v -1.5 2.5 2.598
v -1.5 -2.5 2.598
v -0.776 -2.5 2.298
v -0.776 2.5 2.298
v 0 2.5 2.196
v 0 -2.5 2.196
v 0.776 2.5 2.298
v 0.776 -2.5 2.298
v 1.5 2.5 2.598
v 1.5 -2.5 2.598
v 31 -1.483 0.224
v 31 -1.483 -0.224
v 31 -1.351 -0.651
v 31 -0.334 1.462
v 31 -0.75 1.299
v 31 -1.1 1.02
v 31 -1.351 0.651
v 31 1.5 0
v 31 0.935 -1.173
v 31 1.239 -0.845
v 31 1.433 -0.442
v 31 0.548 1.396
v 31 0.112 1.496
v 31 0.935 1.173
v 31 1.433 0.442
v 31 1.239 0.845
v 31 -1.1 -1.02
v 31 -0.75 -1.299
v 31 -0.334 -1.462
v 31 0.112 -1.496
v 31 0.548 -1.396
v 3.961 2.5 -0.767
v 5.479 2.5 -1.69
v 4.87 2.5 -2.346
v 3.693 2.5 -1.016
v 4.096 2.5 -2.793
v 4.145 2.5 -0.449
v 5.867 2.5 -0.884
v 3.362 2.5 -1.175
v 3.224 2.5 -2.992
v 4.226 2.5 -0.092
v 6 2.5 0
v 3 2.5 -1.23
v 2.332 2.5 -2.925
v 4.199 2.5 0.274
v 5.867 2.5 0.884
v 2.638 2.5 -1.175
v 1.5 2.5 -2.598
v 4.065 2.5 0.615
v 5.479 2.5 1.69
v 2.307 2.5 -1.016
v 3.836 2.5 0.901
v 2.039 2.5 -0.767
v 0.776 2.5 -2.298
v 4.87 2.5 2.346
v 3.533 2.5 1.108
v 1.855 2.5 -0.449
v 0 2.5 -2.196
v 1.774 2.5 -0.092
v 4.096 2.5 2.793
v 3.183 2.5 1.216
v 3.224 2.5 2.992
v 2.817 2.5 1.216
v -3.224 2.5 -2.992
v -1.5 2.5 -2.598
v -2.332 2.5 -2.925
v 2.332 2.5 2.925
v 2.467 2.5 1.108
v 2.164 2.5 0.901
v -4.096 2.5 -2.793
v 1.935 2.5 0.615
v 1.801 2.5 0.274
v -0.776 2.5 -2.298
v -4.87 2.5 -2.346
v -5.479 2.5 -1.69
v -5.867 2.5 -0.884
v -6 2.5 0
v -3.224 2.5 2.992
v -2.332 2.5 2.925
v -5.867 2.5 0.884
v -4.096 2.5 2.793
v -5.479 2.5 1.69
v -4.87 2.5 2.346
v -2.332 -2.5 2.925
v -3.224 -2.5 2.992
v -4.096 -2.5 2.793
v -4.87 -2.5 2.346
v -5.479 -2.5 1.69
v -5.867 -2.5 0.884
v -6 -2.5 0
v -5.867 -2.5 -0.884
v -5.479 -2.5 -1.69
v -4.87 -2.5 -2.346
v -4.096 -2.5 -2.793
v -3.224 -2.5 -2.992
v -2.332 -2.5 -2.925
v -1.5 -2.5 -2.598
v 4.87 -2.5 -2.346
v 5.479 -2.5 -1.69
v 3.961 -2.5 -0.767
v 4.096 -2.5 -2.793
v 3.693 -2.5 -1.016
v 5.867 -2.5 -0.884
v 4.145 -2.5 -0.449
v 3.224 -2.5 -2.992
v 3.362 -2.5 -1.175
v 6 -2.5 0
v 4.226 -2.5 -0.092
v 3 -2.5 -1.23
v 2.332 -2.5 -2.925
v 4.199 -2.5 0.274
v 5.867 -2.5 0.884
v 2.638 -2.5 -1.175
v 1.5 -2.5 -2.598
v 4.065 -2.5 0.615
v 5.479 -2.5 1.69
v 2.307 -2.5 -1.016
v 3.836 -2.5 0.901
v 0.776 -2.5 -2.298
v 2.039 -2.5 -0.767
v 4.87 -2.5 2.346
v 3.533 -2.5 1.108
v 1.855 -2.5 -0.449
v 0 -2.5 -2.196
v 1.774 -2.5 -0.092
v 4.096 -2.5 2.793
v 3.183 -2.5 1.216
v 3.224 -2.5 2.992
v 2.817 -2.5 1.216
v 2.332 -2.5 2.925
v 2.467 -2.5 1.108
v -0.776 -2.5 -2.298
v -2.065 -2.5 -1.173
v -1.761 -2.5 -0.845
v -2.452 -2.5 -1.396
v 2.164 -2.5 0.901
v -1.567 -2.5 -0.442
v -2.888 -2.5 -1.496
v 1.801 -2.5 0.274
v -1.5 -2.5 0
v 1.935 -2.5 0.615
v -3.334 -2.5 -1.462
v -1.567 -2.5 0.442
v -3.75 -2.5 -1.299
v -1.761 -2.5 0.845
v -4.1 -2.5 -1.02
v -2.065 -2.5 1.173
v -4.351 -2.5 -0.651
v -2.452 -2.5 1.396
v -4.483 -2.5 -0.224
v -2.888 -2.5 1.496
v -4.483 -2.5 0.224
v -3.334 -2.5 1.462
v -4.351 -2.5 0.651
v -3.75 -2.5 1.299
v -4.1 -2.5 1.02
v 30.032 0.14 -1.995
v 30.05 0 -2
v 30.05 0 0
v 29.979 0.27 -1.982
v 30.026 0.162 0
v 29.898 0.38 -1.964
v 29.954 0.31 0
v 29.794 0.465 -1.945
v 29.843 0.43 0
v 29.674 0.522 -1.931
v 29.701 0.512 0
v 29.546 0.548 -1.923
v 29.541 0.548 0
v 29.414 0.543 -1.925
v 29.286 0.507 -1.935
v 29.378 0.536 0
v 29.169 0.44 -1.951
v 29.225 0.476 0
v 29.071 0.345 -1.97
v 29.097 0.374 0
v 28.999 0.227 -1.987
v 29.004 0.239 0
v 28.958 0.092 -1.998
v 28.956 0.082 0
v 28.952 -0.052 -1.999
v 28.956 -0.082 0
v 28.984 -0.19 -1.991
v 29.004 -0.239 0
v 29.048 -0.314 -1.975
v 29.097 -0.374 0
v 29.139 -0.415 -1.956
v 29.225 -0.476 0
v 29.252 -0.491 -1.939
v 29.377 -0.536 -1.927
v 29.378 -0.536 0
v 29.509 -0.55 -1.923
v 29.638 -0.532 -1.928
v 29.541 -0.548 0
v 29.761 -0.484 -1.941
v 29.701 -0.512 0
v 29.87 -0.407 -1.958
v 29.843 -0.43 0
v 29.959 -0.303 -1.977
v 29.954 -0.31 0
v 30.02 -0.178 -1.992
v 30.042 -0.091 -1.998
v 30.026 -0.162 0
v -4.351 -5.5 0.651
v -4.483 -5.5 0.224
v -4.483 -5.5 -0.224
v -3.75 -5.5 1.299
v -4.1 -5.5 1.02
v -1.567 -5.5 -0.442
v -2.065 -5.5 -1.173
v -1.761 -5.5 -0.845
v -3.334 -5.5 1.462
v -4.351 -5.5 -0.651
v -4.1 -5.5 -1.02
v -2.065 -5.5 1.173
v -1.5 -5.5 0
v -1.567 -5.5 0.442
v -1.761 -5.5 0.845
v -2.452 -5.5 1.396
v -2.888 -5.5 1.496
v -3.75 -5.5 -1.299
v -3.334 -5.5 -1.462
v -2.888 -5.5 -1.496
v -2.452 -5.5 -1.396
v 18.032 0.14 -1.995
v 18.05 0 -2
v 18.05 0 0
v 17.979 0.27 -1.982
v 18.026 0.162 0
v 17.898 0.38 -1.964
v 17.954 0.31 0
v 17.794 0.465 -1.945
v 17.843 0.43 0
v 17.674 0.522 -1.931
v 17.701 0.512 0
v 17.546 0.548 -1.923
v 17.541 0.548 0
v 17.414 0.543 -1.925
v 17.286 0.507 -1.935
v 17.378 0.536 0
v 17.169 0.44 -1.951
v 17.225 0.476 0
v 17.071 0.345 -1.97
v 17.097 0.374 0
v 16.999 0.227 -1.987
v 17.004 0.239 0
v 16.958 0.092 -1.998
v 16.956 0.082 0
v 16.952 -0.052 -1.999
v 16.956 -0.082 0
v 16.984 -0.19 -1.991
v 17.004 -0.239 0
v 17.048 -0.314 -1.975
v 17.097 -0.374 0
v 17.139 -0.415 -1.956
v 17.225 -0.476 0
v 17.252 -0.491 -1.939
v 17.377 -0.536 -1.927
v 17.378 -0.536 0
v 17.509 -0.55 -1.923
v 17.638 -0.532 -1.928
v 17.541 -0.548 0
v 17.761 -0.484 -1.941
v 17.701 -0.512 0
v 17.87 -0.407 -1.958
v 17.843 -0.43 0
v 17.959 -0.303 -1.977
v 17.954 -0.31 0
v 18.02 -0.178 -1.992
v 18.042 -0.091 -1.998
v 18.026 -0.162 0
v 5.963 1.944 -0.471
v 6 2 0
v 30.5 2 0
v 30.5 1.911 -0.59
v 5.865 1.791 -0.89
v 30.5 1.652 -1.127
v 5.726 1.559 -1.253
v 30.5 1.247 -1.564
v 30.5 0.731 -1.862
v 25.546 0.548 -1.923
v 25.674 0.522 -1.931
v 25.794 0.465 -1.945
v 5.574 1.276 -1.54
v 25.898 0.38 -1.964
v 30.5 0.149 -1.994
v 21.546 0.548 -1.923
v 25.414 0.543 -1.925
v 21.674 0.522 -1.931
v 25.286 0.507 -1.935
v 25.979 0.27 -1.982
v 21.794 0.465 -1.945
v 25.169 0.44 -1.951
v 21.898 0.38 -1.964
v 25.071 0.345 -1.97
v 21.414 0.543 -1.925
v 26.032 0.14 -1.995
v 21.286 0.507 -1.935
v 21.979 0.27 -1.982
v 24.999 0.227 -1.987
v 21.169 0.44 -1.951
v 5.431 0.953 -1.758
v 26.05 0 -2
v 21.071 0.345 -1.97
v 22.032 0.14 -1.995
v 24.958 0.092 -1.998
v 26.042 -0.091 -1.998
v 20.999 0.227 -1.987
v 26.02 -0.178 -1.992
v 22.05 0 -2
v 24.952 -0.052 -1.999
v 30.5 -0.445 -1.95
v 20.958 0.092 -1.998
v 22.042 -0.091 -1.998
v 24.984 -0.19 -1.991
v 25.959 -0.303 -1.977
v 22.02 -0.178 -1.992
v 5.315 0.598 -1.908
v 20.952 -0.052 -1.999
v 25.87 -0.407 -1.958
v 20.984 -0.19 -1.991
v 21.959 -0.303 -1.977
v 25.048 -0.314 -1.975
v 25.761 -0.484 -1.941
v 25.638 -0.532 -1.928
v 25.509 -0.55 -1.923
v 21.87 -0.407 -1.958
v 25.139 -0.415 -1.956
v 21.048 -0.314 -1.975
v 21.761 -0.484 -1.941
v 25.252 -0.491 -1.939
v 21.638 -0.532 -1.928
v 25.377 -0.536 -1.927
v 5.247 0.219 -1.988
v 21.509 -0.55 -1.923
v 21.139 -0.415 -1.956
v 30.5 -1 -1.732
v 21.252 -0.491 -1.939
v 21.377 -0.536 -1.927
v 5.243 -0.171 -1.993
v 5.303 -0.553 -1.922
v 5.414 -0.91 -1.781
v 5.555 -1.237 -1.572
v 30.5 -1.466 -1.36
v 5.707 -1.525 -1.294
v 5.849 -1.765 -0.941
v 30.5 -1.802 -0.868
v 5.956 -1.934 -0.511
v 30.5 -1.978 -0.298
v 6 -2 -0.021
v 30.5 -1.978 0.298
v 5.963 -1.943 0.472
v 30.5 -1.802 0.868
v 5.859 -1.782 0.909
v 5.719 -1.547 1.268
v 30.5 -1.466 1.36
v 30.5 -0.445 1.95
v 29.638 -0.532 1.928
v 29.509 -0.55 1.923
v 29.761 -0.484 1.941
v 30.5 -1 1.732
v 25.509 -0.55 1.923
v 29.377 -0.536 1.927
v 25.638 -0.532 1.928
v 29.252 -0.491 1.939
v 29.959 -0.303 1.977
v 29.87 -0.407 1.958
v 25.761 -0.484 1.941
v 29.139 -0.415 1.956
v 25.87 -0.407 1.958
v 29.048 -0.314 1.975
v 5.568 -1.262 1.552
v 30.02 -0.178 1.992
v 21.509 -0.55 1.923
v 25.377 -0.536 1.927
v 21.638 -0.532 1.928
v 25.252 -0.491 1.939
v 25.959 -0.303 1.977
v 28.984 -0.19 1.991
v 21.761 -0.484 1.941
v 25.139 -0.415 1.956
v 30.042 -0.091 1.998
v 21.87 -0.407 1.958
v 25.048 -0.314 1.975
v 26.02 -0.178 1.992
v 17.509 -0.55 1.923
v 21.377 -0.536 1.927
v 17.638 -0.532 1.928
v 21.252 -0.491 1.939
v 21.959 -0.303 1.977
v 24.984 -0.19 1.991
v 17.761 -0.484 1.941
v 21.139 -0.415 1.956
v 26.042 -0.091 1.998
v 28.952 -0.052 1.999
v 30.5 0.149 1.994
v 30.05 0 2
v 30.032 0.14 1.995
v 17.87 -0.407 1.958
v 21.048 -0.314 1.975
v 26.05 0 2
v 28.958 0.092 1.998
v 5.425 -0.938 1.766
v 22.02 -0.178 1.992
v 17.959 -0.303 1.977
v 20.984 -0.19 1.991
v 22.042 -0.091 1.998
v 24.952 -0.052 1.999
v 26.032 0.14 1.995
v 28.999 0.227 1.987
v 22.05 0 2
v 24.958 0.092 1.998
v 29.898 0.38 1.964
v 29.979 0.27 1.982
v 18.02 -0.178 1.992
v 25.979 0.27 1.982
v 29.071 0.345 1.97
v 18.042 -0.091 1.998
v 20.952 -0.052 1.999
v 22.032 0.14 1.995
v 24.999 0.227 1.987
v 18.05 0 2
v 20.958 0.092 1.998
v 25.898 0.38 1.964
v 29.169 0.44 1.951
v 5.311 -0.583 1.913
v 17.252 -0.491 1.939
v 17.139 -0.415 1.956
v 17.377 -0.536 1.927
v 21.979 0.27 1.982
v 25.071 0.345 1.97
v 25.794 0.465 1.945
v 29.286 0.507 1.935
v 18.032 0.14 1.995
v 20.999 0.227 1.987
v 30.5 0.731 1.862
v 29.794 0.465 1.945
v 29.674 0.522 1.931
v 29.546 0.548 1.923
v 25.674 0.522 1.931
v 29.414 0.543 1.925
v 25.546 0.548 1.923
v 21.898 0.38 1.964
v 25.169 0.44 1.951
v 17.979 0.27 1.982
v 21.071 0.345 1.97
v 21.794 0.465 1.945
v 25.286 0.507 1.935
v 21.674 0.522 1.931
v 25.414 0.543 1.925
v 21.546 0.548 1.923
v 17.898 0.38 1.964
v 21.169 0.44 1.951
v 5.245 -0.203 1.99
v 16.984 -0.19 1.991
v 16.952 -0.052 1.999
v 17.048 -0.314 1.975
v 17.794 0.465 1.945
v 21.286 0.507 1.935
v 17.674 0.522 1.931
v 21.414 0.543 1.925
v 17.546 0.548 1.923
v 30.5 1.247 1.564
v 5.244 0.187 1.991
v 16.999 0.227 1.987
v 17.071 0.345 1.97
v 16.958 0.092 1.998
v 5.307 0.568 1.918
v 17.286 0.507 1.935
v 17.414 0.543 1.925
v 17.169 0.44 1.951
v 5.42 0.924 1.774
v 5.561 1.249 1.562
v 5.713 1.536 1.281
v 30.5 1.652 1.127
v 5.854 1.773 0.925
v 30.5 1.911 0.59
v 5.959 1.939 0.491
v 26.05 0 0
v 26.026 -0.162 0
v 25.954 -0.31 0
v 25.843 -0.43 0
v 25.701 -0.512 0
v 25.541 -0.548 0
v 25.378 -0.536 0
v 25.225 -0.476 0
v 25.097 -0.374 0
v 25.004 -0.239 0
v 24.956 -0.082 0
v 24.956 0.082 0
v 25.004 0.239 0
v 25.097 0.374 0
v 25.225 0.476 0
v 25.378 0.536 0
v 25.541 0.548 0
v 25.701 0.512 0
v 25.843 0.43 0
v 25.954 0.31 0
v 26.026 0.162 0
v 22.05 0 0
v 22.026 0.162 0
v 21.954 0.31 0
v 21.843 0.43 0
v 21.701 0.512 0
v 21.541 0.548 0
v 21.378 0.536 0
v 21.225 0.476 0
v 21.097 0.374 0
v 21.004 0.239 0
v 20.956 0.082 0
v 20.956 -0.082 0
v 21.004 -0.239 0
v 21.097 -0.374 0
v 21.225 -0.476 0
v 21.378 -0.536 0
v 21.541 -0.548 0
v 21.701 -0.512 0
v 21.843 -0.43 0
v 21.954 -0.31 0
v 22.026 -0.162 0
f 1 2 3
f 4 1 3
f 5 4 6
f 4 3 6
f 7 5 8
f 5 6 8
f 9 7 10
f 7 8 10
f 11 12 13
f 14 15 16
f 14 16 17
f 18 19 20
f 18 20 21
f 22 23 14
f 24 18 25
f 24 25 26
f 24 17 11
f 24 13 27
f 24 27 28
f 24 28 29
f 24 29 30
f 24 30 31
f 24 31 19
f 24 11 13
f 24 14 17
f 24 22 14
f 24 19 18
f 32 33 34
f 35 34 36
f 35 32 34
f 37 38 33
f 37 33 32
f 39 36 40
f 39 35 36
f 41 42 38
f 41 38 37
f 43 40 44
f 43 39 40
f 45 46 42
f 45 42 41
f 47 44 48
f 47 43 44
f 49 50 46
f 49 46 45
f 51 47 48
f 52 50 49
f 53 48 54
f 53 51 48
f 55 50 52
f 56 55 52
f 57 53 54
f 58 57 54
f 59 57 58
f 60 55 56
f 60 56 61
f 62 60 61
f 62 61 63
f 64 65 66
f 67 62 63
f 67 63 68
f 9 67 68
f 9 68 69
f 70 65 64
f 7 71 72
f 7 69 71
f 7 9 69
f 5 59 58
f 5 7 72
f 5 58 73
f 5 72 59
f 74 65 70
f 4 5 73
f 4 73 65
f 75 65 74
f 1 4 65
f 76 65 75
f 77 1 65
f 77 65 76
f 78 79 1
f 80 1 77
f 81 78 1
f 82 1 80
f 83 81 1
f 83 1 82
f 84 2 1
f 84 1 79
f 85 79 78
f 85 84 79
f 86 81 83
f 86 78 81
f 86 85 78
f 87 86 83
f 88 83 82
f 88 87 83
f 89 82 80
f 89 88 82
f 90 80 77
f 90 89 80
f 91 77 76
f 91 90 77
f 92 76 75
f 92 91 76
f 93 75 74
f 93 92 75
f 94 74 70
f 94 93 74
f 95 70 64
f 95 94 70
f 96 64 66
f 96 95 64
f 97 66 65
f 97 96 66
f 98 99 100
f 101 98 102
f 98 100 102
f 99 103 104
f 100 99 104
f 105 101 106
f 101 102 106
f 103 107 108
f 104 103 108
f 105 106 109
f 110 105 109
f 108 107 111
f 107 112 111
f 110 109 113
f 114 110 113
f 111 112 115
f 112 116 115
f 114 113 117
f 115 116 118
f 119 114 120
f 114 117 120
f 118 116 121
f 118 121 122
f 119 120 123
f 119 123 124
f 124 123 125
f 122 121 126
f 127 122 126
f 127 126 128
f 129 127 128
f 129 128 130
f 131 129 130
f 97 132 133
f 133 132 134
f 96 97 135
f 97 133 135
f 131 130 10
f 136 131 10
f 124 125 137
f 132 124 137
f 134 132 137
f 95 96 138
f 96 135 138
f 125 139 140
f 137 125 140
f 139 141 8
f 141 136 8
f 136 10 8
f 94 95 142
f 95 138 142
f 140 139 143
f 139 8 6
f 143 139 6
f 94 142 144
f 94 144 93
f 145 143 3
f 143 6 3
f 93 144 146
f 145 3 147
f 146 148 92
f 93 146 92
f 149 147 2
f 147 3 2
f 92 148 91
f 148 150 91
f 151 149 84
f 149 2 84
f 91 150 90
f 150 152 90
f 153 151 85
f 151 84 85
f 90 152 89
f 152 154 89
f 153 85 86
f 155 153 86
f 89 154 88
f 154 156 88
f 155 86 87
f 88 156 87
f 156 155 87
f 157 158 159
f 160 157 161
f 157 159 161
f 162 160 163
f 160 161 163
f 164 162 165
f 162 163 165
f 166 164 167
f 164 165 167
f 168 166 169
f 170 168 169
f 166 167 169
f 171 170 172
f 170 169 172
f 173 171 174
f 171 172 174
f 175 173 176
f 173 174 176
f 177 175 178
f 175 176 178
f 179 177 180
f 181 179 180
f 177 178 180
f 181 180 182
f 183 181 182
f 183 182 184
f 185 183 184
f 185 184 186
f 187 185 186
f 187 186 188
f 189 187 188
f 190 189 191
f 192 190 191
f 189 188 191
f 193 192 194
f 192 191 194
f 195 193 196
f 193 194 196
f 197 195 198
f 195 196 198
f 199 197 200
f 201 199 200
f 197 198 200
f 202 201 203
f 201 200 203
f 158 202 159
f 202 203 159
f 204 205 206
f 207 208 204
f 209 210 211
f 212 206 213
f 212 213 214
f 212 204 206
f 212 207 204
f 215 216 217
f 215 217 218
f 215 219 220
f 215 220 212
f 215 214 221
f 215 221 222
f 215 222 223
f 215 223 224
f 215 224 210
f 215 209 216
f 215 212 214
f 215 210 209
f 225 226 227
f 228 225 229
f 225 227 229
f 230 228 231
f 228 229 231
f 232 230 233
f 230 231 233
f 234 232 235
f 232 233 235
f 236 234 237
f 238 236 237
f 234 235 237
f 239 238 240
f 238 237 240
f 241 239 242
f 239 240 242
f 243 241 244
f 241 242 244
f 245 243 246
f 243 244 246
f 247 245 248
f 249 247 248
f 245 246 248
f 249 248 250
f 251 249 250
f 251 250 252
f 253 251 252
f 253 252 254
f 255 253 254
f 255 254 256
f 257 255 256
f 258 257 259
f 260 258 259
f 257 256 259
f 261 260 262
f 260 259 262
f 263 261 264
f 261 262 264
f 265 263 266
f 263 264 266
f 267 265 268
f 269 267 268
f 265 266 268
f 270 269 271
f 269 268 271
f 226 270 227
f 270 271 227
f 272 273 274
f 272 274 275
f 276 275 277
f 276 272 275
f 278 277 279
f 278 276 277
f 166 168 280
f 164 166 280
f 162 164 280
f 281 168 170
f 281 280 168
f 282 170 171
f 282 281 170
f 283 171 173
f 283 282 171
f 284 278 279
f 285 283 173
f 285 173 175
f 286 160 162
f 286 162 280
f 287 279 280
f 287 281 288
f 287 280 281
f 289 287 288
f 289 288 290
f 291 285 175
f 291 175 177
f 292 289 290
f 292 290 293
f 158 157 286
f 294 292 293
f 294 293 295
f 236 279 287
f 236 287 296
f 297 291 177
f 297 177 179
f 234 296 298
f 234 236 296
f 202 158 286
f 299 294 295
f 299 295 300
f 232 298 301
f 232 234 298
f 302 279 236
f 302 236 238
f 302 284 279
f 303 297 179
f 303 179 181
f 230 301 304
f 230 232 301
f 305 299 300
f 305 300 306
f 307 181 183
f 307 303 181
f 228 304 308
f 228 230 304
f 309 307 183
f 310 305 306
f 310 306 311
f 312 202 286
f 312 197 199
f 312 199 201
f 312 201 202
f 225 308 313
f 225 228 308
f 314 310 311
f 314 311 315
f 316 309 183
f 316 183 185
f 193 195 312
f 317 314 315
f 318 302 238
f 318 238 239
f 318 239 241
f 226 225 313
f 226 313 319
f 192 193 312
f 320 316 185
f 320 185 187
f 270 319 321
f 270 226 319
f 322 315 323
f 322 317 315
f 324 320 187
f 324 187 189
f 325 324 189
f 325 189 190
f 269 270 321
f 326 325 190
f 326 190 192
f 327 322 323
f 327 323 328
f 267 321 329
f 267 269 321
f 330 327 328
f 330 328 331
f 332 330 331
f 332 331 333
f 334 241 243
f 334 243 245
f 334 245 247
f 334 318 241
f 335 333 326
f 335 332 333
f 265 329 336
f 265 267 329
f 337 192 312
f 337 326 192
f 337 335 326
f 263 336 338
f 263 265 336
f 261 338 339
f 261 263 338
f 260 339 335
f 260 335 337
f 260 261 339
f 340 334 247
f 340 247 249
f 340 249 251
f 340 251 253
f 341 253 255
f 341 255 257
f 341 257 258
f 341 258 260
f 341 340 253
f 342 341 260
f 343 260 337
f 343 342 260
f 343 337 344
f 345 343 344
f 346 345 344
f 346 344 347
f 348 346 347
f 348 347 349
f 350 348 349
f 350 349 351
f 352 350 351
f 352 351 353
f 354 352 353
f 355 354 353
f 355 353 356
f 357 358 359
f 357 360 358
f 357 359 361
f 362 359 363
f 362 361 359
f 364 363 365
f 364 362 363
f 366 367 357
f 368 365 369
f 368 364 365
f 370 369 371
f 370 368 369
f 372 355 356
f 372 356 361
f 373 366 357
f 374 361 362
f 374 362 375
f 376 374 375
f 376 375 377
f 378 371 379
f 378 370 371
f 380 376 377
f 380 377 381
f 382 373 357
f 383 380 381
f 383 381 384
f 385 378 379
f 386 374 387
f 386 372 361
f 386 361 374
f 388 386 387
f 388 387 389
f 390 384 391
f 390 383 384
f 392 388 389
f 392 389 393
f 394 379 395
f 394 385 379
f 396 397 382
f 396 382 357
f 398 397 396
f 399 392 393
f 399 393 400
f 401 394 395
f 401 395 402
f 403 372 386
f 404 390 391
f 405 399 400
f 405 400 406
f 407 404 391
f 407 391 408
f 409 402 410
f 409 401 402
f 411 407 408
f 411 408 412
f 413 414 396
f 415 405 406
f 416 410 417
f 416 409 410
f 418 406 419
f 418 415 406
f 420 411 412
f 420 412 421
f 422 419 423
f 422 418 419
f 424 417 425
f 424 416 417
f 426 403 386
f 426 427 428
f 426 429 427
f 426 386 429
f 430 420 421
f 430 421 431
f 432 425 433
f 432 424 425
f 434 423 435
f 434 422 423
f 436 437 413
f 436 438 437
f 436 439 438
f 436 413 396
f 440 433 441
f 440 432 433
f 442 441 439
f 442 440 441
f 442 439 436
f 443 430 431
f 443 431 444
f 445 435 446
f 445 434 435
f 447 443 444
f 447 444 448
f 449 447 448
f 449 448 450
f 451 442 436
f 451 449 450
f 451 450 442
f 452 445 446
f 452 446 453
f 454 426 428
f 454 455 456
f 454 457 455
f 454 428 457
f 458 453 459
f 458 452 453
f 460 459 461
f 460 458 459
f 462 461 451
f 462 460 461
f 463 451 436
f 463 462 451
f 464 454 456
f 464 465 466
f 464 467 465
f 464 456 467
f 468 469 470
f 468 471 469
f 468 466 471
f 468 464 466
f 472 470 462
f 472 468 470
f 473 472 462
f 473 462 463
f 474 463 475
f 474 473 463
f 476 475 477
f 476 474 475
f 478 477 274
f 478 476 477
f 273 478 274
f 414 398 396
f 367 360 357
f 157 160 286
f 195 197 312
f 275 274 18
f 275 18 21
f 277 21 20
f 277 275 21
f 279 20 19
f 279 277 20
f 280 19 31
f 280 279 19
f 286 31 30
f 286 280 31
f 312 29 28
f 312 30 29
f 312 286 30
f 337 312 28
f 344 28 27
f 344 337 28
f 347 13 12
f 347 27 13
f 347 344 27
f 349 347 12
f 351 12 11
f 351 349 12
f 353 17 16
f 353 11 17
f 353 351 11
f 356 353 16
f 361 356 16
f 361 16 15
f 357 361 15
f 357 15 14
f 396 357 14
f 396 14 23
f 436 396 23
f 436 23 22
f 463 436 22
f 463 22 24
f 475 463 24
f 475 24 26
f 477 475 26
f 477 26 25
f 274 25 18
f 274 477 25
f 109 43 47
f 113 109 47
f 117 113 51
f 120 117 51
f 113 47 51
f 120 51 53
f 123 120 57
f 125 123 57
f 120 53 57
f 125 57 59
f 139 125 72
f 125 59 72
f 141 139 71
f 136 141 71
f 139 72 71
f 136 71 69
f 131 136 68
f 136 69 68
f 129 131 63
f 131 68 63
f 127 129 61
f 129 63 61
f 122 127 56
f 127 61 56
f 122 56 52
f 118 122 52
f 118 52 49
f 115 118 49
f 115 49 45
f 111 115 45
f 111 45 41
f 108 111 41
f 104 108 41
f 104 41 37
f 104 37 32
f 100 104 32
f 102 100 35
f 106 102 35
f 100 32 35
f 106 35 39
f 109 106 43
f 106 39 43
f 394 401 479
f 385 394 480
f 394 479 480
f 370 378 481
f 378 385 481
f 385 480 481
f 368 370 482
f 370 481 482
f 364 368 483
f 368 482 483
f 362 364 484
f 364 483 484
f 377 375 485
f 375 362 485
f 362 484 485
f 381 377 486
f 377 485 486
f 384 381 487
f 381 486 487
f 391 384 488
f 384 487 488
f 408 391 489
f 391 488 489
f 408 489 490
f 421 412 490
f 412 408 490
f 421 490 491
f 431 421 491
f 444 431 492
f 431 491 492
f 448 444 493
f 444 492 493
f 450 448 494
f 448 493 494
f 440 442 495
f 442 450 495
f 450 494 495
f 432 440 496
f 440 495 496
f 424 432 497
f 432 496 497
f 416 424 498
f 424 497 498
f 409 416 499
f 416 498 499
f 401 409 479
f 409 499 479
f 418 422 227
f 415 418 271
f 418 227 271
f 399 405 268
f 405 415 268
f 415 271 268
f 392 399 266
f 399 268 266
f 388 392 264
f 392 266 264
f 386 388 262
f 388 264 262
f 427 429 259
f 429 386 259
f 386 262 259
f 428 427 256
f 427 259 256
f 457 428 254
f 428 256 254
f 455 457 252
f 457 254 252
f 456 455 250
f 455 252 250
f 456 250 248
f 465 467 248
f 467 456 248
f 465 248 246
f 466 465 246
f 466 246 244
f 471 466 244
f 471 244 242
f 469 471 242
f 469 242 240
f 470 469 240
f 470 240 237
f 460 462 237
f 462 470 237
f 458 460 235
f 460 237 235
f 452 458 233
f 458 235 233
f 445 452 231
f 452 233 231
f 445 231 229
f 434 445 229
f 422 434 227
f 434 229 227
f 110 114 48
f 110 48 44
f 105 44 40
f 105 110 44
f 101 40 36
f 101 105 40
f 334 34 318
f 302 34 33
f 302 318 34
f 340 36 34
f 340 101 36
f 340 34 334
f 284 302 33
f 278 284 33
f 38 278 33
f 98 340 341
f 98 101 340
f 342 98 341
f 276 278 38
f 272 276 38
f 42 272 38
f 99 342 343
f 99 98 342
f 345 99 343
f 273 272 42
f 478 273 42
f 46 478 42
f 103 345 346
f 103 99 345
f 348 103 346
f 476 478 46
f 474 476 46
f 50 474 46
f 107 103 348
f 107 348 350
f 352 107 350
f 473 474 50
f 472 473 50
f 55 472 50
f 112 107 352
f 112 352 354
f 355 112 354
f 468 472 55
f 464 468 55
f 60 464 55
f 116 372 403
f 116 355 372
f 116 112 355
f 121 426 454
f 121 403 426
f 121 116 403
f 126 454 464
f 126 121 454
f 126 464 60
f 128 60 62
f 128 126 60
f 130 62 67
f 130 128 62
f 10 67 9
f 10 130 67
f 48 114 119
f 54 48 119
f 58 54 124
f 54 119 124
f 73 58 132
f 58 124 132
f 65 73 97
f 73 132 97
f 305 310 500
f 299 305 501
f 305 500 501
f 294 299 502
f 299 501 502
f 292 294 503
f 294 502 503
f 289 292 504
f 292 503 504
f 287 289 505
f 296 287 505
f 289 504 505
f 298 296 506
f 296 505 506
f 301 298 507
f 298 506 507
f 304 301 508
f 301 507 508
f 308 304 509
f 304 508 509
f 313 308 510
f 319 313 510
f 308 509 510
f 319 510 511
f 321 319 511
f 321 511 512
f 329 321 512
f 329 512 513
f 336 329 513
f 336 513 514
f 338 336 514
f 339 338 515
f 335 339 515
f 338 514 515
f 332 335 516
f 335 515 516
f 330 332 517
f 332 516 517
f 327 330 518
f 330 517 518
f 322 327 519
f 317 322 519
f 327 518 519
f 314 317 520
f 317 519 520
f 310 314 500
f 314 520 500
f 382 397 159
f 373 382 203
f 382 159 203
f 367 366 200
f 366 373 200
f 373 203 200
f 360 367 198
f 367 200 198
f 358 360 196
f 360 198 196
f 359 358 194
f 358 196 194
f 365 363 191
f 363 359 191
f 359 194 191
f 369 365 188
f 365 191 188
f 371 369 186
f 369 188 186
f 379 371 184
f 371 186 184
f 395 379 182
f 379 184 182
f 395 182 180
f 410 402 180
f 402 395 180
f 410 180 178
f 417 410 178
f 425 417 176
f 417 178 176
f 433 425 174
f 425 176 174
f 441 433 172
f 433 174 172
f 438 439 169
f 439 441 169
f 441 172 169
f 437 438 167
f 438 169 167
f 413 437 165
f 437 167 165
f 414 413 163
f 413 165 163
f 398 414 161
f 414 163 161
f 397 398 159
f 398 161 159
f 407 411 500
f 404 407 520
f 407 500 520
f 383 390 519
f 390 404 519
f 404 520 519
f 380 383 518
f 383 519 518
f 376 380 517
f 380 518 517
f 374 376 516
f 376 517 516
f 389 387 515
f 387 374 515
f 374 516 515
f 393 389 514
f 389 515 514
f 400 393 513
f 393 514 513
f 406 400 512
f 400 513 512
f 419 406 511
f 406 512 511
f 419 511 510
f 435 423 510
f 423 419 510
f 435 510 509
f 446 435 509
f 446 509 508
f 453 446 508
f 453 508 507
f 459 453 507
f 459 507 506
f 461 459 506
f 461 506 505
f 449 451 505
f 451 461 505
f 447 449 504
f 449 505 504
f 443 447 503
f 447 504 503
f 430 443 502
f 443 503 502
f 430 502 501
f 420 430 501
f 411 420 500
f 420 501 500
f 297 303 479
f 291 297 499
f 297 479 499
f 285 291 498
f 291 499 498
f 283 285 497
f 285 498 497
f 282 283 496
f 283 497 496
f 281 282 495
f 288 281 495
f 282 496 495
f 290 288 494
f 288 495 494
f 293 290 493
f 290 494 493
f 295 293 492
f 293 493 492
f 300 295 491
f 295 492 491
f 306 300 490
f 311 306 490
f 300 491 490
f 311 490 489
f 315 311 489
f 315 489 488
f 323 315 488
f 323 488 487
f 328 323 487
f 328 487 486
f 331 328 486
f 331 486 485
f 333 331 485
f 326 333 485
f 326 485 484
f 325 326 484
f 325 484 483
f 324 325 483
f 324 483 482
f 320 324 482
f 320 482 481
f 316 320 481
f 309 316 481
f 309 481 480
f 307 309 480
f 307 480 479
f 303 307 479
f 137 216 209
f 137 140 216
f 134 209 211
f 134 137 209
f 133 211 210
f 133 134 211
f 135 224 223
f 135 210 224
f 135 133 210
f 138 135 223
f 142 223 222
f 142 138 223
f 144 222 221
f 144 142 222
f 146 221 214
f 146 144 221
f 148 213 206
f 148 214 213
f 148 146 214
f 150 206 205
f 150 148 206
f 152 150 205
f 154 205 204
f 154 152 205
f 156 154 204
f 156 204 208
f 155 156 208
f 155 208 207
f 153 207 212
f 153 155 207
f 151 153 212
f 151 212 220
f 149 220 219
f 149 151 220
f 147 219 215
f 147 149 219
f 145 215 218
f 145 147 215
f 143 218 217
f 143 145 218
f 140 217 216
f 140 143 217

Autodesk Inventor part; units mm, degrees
ref_plane "YZ Plane" through (0, 0, 0) normal (1, 0, 0) x (0, 1, 0)
ref_plane "XZ Plane" through (0, 0, 0) normal (0, 1, 0) x (-1, 0, 0)
ref_plane "XY Plane" through (0, 0, 0) normal (0, 0, 1) x (1, 0, 0)
sketch "Sketch1" plane through (0, 0, 0) normal (0, 1, 0) x (-1, 0, 0)
  arc A0 (1.5, -2.5981) -> (1.5, 2.5981) centre (3, 0) ccw
  arc A1 (-1.5, 2.5981) -> (-1.5, -2.5981) centre (-3, 0) ccw
  arc A2 (-1.5, 2.5981) -> (1.5, 2.5981) centre (0, 5.1962) ccw
  arc A3 (1.5, -2.5981) -> (-1.5, -2.5981) centre (0, -5.1962) ccw
  point P0 (0, 0)
  dimension "d0" = 6
  dimension "d1" = 6
  dimension "d2" = 6
  dimension "d3" = 3
  dimension "d4" = 6
  dimension "d5" = 6
extrude "Extrusion1" add sketch "Sketch1" along normal mid plane 5
sketch "Sketch2" plane through (0, 0, 0) normal (1, 0, 0) x (0, 1, 0)
  circle A0 centre (0, 0) radius 2
  dimension "d8" = 4
extrude "Extrusion2" add sketch "Sketch2" along normal blind 31
sketch "Sketch3" plane through (0, -2.5, 0) normal (0, -1, 0) x (1, 0, 0)
  arc A0 (-1.5, 2.5981) -> (-1.5, -2.5981) centre (-3, 0) ccw projected
  circle A1 centre (-3, 0) radius 1.5
  point P0 (0, 0)
  dimension "d11" = 3
extrude "Extrusion3" add sketch "Sketch3" along normal blind 3
hole "Hole1" at (3, -2.5, 0) direction (0, 1, 0) diameter 2.459 depth 8.8 tip angle 118 thread size "M3x0.5" class "6H" standard "ISO Metric profile"
sketch "Sketch4" plane through (0, 0, 0) normal (0, 0, 1) x (1, 0, 0)
  line L0 (-1.5, -2.5) -> (-1.5, -5.5) construction
  line L1 (-1.5, -5.5) -> (-4.5, -5.5) construction
  line L2 (-4.5, -5.5) -> (-4.5, -2.5) construction
  line L3 (-4.5, -2.5) -> (-6, -2.5) construction
  line L4 (-6, -2.5) -> (-6, 2.5) construction
  line L5 (-6, 2.5) -> (1.7705, 2.5) construction
  line L6 (1.7705, 2.5) -> (1.7705, -2.5) construction
  line L7 (1.7705, -2.5) -> (-1.5, -2.5) construction
  line L8 (6, 2) -> (31, 2) construction
  line L9 (31, 2) -> (31, -2) construction
  line L10 (31, -2) -> (6, -2) construction
  line L11 (6, -2) -> (6, -2.5) construction
  line L12 (6, -2.5) -> (4.2295, -2.5) construction
  line L13 (4.2295, -2.5) -> (4.2295, 2.5) construction
  line L14 (4.2295, 2.5) -> (6, 2.5) construction
  line L15 (6, 2.5) -> (6, 2) construction
  circle A0 centre (29.5, 0) radius 0.55
  point P0 (0, 0)
  dimension "d23" = 1.1
  dimension "d24" = 1.5
extrude "Extrusion4" cut sketch "Sketch4" along normal mid plane 17.5
pattern_linear "Rectangular Pattern1" count 4 spacing 4 along (-1, 0, 0) of "Extrusion4"
chamfer "Chamfer1" distance 0.5 angle 45 1 edges at (31, -2, 0)
properties part number "500-178" material "ABS Plastic"
